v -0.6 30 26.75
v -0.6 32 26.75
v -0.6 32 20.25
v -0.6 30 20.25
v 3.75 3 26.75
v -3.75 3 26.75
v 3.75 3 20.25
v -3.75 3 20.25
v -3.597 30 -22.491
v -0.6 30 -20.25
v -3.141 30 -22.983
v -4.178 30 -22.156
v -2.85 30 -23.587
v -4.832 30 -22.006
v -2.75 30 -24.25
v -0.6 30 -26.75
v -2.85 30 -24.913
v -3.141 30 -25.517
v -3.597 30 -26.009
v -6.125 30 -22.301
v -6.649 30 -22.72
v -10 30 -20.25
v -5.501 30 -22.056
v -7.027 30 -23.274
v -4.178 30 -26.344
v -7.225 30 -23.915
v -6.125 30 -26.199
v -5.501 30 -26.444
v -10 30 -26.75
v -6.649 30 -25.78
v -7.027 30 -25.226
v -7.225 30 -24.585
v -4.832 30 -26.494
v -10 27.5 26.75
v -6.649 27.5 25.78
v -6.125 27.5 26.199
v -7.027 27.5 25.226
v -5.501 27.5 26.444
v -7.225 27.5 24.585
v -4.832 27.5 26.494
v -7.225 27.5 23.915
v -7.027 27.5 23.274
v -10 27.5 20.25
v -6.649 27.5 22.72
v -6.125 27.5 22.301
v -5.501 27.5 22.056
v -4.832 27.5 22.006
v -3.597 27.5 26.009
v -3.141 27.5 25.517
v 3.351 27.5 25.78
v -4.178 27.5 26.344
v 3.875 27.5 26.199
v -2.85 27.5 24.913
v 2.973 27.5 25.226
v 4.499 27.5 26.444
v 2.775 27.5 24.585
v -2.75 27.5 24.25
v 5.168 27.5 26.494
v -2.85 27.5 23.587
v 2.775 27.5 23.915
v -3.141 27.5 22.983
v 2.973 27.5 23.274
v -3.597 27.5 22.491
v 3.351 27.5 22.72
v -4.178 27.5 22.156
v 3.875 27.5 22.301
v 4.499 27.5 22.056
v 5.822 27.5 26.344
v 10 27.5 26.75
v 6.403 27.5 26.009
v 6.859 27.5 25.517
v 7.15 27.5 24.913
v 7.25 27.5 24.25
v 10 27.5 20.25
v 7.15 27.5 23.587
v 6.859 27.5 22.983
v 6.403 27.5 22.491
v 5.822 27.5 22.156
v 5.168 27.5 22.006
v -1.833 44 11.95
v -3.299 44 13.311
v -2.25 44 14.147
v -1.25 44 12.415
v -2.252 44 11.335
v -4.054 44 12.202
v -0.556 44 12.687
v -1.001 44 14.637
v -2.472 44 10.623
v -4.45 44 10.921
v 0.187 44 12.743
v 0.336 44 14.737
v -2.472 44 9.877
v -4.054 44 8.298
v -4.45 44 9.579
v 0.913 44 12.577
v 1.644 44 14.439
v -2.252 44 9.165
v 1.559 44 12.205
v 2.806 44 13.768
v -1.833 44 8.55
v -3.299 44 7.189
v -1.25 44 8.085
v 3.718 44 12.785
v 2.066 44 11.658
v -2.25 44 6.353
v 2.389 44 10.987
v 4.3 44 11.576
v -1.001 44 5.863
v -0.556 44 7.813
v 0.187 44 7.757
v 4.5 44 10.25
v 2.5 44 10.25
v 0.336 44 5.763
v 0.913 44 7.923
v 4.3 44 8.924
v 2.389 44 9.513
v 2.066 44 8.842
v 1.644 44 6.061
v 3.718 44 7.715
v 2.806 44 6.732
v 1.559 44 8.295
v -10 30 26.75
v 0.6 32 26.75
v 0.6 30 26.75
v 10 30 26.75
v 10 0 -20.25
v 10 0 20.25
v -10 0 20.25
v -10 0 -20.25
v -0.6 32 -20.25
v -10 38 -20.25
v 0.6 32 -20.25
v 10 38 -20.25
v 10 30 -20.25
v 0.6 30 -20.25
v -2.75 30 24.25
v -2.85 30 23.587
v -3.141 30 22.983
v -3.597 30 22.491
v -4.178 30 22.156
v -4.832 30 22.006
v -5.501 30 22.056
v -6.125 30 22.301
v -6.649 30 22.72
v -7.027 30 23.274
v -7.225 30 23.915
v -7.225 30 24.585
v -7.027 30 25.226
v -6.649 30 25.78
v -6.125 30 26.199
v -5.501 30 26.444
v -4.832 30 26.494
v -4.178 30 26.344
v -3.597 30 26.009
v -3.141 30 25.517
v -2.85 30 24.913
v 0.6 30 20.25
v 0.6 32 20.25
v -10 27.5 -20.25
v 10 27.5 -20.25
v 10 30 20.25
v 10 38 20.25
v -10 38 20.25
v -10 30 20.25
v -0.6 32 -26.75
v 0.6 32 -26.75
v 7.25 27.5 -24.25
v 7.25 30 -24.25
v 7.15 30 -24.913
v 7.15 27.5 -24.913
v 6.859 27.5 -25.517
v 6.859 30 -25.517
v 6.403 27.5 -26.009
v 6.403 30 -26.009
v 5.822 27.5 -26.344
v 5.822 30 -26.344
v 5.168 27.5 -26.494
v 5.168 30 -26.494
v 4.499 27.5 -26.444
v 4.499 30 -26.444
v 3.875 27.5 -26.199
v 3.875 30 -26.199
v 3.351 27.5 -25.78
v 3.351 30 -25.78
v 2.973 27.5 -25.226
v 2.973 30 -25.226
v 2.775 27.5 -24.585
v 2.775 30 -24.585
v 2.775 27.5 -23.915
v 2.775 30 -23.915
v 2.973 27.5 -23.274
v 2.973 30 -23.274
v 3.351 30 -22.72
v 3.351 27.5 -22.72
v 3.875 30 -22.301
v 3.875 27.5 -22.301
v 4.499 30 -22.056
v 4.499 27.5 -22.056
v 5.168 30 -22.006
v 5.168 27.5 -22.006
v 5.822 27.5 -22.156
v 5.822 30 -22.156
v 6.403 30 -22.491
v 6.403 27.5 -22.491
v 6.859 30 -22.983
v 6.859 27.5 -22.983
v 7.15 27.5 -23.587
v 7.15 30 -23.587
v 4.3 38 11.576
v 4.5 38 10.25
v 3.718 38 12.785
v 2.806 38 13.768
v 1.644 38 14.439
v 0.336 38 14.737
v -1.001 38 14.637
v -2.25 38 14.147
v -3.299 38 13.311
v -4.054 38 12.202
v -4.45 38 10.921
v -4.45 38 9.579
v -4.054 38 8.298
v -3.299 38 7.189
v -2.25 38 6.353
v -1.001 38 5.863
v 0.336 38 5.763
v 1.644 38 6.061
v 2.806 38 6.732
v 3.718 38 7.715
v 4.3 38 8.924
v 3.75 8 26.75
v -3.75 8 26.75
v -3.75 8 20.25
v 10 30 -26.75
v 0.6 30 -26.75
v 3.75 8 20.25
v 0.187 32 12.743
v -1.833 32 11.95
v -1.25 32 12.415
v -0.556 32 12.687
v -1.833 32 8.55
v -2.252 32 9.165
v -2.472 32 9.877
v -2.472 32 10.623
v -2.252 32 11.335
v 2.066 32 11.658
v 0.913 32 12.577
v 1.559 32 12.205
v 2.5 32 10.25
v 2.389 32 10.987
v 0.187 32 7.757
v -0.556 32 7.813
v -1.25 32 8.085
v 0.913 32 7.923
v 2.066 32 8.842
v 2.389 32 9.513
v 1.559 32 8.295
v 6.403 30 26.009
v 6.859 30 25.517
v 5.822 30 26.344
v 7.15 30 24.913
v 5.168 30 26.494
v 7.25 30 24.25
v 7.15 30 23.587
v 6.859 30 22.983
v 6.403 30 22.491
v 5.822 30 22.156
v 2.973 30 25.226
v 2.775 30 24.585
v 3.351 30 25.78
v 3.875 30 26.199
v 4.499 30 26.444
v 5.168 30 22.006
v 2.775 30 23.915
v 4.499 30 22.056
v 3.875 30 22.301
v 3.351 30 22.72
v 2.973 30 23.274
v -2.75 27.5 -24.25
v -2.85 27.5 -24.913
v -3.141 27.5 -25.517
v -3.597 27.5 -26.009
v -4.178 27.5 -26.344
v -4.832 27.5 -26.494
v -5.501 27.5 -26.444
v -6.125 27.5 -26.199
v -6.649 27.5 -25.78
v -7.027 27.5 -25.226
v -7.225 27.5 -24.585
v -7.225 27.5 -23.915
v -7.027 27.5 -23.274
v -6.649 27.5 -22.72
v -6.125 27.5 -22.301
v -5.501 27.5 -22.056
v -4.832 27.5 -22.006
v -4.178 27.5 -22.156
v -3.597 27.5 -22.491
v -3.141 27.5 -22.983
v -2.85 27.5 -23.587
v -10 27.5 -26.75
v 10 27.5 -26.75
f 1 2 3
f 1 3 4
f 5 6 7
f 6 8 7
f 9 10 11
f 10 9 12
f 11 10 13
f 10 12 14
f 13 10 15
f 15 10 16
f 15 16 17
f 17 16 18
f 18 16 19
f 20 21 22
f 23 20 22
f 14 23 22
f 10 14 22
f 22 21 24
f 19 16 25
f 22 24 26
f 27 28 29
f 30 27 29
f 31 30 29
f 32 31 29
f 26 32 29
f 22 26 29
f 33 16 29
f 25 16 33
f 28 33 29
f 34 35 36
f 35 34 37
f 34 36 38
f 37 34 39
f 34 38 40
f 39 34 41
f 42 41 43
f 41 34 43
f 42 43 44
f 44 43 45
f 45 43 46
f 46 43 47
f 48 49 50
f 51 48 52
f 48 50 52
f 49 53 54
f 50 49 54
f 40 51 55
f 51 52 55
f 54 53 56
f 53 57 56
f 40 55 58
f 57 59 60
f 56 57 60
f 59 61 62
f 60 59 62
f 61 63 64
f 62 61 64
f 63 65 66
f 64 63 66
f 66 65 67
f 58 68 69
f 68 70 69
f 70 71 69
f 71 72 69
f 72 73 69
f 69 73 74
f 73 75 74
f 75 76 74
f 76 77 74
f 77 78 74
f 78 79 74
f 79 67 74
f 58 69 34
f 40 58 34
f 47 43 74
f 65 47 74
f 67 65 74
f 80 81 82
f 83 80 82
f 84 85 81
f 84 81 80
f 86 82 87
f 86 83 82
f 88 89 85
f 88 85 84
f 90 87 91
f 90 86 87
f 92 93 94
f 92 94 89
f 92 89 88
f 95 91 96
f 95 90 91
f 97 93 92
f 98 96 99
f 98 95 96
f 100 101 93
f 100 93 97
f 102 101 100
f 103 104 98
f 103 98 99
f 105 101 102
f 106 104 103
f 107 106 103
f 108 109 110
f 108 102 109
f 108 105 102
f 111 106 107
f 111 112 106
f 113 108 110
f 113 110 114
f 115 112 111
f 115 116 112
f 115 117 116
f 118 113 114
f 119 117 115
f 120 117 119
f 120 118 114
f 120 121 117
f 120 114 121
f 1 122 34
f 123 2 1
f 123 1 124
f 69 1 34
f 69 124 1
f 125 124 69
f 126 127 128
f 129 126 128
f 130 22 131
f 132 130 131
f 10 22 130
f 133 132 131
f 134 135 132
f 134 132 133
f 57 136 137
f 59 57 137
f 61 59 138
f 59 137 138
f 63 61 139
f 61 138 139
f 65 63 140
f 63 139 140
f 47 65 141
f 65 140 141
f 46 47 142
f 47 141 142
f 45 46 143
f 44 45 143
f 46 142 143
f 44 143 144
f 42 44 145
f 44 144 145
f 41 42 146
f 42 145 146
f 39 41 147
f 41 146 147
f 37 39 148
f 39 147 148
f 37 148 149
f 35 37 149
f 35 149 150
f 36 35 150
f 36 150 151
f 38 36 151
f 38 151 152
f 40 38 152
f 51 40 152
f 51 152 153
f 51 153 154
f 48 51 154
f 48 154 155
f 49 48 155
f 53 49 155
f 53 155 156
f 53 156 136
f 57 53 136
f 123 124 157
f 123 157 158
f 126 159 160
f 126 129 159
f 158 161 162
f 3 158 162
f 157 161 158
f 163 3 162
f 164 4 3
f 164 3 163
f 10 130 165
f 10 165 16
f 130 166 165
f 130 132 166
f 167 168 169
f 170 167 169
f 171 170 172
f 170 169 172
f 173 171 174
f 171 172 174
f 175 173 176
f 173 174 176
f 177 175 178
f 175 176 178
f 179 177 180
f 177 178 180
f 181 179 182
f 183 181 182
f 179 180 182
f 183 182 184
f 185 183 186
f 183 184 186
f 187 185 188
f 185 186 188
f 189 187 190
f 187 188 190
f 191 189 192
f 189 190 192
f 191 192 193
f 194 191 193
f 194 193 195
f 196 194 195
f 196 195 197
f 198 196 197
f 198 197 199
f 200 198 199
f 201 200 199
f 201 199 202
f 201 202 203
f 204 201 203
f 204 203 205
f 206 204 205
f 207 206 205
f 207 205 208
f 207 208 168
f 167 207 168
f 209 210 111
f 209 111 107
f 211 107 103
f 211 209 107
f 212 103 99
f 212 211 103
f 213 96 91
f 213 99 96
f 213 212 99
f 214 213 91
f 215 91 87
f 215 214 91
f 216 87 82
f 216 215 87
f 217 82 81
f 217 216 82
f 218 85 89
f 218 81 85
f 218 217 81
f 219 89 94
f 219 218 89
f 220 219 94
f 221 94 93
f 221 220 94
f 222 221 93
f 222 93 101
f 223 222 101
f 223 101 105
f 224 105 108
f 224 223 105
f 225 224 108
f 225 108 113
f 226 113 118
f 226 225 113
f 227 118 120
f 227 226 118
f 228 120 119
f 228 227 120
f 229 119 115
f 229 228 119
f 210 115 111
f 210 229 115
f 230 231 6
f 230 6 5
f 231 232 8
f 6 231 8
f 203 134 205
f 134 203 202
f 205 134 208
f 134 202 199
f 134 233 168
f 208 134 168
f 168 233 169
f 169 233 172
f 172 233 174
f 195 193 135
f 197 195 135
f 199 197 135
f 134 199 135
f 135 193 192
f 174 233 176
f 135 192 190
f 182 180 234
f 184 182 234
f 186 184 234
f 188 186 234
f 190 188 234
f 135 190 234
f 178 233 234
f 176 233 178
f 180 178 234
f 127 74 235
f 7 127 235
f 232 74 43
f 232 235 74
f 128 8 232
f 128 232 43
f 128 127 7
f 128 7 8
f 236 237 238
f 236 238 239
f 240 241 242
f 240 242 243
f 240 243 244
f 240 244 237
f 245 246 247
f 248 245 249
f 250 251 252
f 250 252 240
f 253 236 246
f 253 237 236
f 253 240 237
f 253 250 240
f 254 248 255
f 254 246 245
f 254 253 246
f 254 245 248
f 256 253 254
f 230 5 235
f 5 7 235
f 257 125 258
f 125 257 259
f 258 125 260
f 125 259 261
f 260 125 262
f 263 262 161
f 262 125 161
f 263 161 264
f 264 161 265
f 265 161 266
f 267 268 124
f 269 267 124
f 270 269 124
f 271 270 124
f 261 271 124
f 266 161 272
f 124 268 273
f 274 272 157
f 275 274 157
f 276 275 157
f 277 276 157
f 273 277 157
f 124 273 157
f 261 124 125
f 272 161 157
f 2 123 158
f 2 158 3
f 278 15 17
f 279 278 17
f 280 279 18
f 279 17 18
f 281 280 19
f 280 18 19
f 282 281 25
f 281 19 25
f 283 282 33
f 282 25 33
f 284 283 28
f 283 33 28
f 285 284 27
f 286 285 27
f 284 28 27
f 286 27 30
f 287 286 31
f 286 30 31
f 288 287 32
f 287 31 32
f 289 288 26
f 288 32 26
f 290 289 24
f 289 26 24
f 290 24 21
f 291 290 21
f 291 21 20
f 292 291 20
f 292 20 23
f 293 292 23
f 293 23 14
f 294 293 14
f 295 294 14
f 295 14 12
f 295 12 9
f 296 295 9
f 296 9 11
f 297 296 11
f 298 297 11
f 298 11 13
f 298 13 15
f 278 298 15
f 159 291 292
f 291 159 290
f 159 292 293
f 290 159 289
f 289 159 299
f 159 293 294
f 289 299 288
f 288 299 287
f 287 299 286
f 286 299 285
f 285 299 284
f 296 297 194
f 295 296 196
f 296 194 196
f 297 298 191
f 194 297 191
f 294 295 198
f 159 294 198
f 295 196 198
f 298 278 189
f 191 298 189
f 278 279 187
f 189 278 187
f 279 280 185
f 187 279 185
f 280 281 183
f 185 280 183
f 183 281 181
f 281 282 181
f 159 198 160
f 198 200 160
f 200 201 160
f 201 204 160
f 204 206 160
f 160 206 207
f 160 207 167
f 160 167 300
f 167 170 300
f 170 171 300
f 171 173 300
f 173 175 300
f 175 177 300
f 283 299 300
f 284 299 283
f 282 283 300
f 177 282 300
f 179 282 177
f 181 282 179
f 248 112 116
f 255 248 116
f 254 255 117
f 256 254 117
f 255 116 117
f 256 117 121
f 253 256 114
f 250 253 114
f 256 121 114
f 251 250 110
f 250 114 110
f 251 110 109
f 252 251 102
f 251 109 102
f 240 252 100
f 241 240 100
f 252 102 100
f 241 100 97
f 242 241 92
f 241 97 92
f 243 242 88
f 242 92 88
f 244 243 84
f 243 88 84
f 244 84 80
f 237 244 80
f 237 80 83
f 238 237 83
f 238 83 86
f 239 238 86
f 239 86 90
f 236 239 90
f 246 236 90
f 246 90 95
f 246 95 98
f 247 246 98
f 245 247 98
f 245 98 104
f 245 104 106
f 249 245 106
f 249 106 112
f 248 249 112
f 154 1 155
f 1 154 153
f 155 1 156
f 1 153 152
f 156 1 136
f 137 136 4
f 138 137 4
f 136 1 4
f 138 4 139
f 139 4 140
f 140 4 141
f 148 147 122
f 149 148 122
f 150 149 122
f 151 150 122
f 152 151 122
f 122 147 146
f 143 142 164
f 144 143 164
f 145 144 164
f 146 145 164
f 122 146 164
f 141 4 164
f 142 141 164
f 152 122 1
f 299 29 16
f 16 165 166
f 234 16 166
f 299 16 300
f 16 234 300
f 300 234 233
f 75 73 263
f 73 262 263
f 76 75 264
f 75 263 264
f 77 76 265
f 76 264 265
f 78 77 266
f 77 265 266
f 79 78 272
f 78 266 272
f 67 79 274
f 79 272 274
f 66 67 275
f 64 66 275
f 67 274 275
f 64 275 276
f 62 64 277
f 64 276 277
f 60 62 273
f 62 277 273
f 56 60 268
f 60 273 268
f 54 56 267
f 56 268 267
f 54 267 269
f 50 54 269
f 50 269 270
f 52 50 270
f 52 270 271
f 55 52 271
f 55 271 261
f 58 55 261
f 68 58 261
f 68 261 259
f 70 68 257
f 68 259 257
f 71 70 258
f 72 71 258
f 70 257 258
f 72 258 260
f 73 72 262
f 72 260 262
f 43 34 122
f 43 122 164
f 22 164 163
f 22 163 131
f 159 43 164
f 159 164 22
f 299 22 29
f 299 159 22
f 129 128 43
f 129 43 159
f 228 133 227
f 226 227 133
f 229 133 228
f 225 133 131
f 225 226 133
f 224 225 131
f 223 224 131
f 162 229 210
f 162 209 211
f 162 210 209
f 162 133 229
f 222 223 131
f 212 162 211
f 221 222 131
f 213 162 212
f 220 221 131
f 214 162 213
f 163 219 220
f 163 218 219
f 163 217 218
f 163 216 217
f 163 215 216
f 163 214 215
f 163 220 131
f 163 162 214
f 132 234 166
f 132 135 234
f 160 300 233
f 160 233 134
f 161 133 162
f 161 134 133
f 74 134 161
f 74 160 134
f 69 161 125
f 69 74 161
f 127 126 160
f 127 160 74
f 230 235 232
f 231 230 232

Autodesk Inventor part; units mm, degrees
ref_plane "YZ Plane" through (0, 0, 0) normal (1, 0, 0) x (0, 1, 0)
ref_plane "XZ Plane" through (0, 0, 0) normal (0, 1, 0) x (-1, 0, 0)
ref_plane "XY Plane" through (0, 0, 0) normal (0, 0, 1) x (1, 0, 0)
sketch "Sketch1" plane through (0, 0, 0) normal (0, 1, 0) x (-1, 0, 0)
  line L0 (-10, 20.25) -> (10, 20.25)
  line L1 (10, 20.25) -> (10, -20.25)
  line L2 (10, -20.25) -> (-10, -20.25)
  line L3 (-10, -20.25) -> (-10, 20.25)
  point P0 (0, 0)
  point P1 (0, 20.25)
  point P2 (10, 0)
  dimension "s_width" = 40.5
  dimension "s_depth" = 20
extrude "Extrusion1" add sketch "Sketch1" along normal blind 38
sketch "Sketch2" plane through (-10, 0, 20.25) normal (0, 0, 1) x (1, 0, 0)
  line L0 (0, 38) -> (20, 38) construction
  line L1 (10, 38) -> (10, 0) construction
  line L2 (0, 27.5) -> (20, 27.5)
  line L3 (20, 27.5) -> (20, 30)
  line L4 (20, 30) -> (0, 30)
  line L5 (0, 30) -> (0, 27.5)
  dimension "s_land_thickness" = 2.5
  dimension "s_land_dist_top" = 8
extrude "Extrusion2" add sketch "Sketch2" along normal blind 6.5 and the other way blind 47
sketch "Sketch3" plane through (-10, 30, 20.25) normal (0, 1, 0) x (1, 0, 0)
  line L0 (0, -6.5) -> (0, 0) construction
  line L1 (20, 0) -> (20, -6.5) construction
  circle A0 centre (5, -4) radius 2.25
  line L2 (0, -4) -> (20, -4) construction
  line L3 (20, -6.5) -> (0, -6.5) projected
  line L4 (0, 47) -> (0, 40.5) construction
  line L5 (0, 44.5) -> (20, 44.5) construction
  line L6 (20, 47) -> (20, 40.5) construction
  line L7 (0, 47) -> (20, 47) projected
  circle A1 centre (15, 44.5) radius 2.25
  circle A2 centre (15, -4) radius 2.25
  circle A3 centre (5, 44.5) radius 2.25
  point P0 (10, 20.25)
  dimension "s_hole_dia" = 4.5
  dimension "s_hole_front_dist" = 2.5
  dimension "d13" = 2.5
  dimension "s_hole_side_dist" = 2.75
  dimension "d42" = 2.75
extrude "Extrusion3" cut sketch "Sketch3" against normal up to next
sketch "Sketch4" plane through (-10, 0, 20.25) normal (0, 0, 1) x (1, 0, 0)
  line L0 (6.25, 3) -> (13.75, 3)
  line L1 (13.75, 3) -> (13.75, 8)
  line L2 (13.75, 8) -> (6.25, 8)
  line L3 (6.25, 8) -> (6.25, 3)
  line L4 (10, 0) -> (10, 27.5) construction
  line L5 (20, 27.5) -> (0, 27.5) construction
  line L6 (20, 0) -> (0, 0) construction
  point P0 (10, 8)
  dimension "s_cable_height" = 5
  dimension "s_cable_width" = 7.5
  dimension "s_cable_dist_bottom" = 3
extrude "Extrusion4" add sketch "Sketch4" along normal blind 6.5
sketch "Sketch5" plane through (-10, 38, 20.25) normal (0, 0, 1) x (1, 0, 0)
  line L0 (0, 0) -> (20, 0) construction
  line L1 (10, 0) -> (10, -8) construction
  line L2 (0, -8) -> (20, -8) construction
  line L3 (0, -8) -> (0, 0) construction
  line L4 (0, -4) -> (20, -4) construction
  line L5 (20, -8) -> (20, 0) construction
  line L6 (9.4, -8) -> (10.6, -8)
  line L7 (10.6, -8) -> (10.6, -6)
  line L8 (10.6, -6) -> (9.4, -6)
  line L9 (9.4, -6) -> (9.4, -8)
  line L10 (20, -8) -> (0, -8) projected
  point P0 (10, -38)
  point P1 (10, -8)
  dimension "s_land_pin_thickness" = 2
  dimension "d27" = 1.2
extrude "Extrusion5" add sketch "Sketch5" against normal up to surface (53.5 mm away) from surface at 6.5
sketch "Sketch6" plane through (0, 38, 0) normal (0, 1, 0) x (1, 0, 0)
  circle A0 centre (0, -10.25) radius 4.5
  line L0 (0, 0) -> (0, -26.75) construction
  line L1 (-10, -26.75) -> (10, -26.75) construction
  line L2 (10, 20.25) -> (-10, 20.25) projected
  line L3 (-10, -20.25) -> (10, -20.25) projected
  dimension "s_shaft_dia" = 9
  dimension "s_shaft_front_dist" = 10
extrude "Extrusion6" add sketch "Sketch6" along normal blind 6
sketch "Sketch8" plane through (0, 44, 10.25) normal (0, 1, 0) x (1, 0, 0)
  circle A0 centre (0, 0) radius 2.5
  circle A1 centre (0, 0) radius 4.5 construction
  point P0 (0, 10.25)
  dimension "d39" = 5
extrude "Extrusion8" cut sketch "Sketch8" against normal blind 12
equation "\"d7\" = s_land + s_width"
equation "\"d13\" = s_hole_front_dist"
equation "\"d42\" = s_hole_side_dist"
equation "\"s_land\" = 6.5"
properties part number "Servo"
